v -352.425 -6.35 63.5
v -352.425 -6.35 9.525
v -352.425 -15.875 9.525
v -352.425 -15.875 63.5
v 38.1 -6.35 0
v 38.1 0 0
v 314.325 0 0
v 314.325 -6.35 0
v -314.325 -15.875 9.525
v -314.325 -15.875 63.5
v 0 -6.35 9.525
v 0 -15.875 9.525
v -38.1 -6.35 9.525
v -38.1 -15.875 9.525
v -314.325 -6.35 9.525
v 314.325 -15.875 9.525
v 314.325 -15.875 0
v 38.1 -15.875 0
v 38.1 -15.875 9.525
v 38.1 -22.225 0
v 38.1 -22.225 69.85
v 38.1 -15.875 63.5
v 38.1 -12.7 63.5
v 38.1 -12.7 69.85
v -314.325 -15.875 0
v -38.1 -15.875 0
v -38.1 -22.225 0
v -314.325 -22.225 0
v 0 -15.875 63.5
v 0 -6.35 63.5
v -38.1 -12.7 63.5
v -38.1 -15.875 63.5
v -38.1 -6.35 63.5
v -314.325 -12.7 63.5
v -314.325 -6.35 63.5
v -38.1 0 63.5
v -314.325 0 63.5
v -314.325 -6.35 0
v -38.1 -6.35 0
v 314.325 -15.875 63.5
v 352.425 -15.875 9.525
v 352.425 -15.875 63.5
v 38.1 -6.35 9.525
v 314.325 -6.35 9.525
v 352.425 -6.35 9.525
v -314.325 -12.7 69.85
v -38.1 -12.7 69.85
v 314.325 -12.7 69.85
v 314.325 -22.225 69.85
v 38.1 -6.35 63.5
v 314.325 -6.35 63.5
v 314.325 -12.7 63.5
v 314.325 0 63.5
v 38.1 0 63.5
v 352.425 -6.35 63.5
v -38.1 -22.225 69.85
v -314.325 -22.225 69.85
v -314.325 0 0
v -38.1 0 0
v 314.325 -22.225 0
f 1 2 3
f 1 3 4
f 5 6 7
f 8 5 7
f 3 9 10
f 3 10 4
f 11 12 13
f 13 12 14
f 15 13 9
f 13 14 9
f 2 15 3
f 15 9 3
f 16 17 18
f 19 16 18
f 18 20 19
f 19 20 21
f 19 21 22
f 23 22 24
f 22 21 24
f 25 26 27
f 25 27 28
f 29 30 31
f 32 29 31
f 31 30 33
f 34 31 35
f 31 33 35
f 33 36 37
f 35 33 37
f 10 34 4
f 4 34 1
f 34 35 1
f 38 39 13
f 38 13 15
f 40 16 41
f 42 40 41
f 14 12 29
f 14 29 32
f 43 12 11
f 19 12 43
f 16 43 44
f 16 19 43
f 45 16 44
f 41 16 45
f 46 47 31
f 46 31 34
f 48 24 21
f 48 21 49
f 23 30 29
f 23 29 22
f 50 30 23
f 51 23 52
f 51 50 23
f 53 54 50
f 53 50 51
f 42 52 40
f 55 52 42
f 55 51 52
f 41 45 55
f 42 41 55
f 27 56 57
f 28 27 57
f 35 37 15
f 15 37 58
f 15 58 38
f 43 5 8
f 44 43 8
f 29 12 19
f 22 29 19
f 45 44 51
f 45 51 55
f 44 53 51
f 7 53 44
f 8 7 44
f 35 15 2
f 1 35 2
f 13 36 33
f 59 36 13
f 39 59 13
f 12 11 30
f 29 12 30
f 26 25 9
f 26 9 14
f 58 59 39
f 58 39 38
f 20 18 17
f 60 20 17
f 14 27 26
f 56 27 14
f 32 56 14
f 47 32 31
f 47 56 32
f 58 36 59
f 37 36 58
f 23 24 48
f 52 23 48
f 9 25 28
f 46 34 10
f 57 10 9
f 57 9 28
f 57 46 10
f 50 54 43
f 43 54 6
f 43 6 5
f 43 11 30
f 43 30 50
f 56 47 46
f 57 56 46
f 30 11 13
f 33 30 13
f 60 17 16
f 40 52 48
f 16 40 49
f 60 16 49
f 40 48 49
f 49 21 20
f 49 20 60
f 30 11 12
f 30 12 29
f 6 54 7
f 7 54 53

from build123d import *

# Parameters (mm, degrees)
F0_W     = 352.425
F0_H     = 69.85
F1_DEPTH = 22.225
F2_W     = 38.1
F2_H     = 6.35
F3_DEPTH = 69.85
F2_H_2   = 9.525
F2_W_2   = 276.225
F4_DEPTH = 9.525
F6_DEPTH = 6.35


with BuildPart() as f1:
    # F0 (on Front) → F1 (new body)
    with BuildSketch(Plane.XZ):
        with Locations((176.2125, 34.925)):
            Rectangle(F0_W, F0_H)
    extrude(amount=F1_DEPTH)

    # F2 (on face) → F3 (cut, through all)
    with BuildSketch(Plane(origin=(0, 0, 0), x_dir=(1, 0, 0), z_dir=(0, 0, -1))):
        with Locations((19.05, 19.05)):
            Rectangle(F2_W, F2_H)
        with Locations((19.05, 3.175)):
            Rectangle(F2_W, F2_H)
        with Locations((333.375, 19.05)):
            Rectangle(F2_W, F2_H)
        with Locations((333.375, 3.175)):
            Rectangle(F2_W, F2_H)
    extrude(amount=-F3_DEPTH, mode=Mode.SUBTRACT)

    # F2 (on face) → F4 (cut)
    with BuildSketch(Plane(origin=(0, 0, 0), x_dir=(1, 0, 0), z_dir=(0, 0, -1))):
        with Locations((19.05, 11.1125)):
            Rectangle(F2_W, F2_H_2)
        with Locations((176.2125, 11.1125)):
            Rectangle(F2_W_2, F2_H_2)
        with Locations((333.375, 11.1125)):
            Rectangle(F2_W, F2_H_2)
    extrude(amount=-F4_DEPTH, mode=Mode.SUBTRACT)

    # F5 (on face) → F6 (cut)
    with BuildSketch(Plane.XY.offset(69.85)):
        Polygon((314.325, 0), (38.1, 0), (38.1, -6.35), (0, -6.35), (0, -15.875), (38.1, -15.875), (38.1, -12.7), (314.325, -12.7), (314.325, -15.875), (352.425, -15.875), (352.425, -6.35), (314.325, -6.35), align=None)
    extrude(amount=-F6_DEPTH, mode=Mode.SUBTRACT)


with BuildPart() as f7_1:
    # F7: instance of F1
    add(f1.part.mirror(Plane.YZ))


solid = Compound([f1.part, f7_1.part])
